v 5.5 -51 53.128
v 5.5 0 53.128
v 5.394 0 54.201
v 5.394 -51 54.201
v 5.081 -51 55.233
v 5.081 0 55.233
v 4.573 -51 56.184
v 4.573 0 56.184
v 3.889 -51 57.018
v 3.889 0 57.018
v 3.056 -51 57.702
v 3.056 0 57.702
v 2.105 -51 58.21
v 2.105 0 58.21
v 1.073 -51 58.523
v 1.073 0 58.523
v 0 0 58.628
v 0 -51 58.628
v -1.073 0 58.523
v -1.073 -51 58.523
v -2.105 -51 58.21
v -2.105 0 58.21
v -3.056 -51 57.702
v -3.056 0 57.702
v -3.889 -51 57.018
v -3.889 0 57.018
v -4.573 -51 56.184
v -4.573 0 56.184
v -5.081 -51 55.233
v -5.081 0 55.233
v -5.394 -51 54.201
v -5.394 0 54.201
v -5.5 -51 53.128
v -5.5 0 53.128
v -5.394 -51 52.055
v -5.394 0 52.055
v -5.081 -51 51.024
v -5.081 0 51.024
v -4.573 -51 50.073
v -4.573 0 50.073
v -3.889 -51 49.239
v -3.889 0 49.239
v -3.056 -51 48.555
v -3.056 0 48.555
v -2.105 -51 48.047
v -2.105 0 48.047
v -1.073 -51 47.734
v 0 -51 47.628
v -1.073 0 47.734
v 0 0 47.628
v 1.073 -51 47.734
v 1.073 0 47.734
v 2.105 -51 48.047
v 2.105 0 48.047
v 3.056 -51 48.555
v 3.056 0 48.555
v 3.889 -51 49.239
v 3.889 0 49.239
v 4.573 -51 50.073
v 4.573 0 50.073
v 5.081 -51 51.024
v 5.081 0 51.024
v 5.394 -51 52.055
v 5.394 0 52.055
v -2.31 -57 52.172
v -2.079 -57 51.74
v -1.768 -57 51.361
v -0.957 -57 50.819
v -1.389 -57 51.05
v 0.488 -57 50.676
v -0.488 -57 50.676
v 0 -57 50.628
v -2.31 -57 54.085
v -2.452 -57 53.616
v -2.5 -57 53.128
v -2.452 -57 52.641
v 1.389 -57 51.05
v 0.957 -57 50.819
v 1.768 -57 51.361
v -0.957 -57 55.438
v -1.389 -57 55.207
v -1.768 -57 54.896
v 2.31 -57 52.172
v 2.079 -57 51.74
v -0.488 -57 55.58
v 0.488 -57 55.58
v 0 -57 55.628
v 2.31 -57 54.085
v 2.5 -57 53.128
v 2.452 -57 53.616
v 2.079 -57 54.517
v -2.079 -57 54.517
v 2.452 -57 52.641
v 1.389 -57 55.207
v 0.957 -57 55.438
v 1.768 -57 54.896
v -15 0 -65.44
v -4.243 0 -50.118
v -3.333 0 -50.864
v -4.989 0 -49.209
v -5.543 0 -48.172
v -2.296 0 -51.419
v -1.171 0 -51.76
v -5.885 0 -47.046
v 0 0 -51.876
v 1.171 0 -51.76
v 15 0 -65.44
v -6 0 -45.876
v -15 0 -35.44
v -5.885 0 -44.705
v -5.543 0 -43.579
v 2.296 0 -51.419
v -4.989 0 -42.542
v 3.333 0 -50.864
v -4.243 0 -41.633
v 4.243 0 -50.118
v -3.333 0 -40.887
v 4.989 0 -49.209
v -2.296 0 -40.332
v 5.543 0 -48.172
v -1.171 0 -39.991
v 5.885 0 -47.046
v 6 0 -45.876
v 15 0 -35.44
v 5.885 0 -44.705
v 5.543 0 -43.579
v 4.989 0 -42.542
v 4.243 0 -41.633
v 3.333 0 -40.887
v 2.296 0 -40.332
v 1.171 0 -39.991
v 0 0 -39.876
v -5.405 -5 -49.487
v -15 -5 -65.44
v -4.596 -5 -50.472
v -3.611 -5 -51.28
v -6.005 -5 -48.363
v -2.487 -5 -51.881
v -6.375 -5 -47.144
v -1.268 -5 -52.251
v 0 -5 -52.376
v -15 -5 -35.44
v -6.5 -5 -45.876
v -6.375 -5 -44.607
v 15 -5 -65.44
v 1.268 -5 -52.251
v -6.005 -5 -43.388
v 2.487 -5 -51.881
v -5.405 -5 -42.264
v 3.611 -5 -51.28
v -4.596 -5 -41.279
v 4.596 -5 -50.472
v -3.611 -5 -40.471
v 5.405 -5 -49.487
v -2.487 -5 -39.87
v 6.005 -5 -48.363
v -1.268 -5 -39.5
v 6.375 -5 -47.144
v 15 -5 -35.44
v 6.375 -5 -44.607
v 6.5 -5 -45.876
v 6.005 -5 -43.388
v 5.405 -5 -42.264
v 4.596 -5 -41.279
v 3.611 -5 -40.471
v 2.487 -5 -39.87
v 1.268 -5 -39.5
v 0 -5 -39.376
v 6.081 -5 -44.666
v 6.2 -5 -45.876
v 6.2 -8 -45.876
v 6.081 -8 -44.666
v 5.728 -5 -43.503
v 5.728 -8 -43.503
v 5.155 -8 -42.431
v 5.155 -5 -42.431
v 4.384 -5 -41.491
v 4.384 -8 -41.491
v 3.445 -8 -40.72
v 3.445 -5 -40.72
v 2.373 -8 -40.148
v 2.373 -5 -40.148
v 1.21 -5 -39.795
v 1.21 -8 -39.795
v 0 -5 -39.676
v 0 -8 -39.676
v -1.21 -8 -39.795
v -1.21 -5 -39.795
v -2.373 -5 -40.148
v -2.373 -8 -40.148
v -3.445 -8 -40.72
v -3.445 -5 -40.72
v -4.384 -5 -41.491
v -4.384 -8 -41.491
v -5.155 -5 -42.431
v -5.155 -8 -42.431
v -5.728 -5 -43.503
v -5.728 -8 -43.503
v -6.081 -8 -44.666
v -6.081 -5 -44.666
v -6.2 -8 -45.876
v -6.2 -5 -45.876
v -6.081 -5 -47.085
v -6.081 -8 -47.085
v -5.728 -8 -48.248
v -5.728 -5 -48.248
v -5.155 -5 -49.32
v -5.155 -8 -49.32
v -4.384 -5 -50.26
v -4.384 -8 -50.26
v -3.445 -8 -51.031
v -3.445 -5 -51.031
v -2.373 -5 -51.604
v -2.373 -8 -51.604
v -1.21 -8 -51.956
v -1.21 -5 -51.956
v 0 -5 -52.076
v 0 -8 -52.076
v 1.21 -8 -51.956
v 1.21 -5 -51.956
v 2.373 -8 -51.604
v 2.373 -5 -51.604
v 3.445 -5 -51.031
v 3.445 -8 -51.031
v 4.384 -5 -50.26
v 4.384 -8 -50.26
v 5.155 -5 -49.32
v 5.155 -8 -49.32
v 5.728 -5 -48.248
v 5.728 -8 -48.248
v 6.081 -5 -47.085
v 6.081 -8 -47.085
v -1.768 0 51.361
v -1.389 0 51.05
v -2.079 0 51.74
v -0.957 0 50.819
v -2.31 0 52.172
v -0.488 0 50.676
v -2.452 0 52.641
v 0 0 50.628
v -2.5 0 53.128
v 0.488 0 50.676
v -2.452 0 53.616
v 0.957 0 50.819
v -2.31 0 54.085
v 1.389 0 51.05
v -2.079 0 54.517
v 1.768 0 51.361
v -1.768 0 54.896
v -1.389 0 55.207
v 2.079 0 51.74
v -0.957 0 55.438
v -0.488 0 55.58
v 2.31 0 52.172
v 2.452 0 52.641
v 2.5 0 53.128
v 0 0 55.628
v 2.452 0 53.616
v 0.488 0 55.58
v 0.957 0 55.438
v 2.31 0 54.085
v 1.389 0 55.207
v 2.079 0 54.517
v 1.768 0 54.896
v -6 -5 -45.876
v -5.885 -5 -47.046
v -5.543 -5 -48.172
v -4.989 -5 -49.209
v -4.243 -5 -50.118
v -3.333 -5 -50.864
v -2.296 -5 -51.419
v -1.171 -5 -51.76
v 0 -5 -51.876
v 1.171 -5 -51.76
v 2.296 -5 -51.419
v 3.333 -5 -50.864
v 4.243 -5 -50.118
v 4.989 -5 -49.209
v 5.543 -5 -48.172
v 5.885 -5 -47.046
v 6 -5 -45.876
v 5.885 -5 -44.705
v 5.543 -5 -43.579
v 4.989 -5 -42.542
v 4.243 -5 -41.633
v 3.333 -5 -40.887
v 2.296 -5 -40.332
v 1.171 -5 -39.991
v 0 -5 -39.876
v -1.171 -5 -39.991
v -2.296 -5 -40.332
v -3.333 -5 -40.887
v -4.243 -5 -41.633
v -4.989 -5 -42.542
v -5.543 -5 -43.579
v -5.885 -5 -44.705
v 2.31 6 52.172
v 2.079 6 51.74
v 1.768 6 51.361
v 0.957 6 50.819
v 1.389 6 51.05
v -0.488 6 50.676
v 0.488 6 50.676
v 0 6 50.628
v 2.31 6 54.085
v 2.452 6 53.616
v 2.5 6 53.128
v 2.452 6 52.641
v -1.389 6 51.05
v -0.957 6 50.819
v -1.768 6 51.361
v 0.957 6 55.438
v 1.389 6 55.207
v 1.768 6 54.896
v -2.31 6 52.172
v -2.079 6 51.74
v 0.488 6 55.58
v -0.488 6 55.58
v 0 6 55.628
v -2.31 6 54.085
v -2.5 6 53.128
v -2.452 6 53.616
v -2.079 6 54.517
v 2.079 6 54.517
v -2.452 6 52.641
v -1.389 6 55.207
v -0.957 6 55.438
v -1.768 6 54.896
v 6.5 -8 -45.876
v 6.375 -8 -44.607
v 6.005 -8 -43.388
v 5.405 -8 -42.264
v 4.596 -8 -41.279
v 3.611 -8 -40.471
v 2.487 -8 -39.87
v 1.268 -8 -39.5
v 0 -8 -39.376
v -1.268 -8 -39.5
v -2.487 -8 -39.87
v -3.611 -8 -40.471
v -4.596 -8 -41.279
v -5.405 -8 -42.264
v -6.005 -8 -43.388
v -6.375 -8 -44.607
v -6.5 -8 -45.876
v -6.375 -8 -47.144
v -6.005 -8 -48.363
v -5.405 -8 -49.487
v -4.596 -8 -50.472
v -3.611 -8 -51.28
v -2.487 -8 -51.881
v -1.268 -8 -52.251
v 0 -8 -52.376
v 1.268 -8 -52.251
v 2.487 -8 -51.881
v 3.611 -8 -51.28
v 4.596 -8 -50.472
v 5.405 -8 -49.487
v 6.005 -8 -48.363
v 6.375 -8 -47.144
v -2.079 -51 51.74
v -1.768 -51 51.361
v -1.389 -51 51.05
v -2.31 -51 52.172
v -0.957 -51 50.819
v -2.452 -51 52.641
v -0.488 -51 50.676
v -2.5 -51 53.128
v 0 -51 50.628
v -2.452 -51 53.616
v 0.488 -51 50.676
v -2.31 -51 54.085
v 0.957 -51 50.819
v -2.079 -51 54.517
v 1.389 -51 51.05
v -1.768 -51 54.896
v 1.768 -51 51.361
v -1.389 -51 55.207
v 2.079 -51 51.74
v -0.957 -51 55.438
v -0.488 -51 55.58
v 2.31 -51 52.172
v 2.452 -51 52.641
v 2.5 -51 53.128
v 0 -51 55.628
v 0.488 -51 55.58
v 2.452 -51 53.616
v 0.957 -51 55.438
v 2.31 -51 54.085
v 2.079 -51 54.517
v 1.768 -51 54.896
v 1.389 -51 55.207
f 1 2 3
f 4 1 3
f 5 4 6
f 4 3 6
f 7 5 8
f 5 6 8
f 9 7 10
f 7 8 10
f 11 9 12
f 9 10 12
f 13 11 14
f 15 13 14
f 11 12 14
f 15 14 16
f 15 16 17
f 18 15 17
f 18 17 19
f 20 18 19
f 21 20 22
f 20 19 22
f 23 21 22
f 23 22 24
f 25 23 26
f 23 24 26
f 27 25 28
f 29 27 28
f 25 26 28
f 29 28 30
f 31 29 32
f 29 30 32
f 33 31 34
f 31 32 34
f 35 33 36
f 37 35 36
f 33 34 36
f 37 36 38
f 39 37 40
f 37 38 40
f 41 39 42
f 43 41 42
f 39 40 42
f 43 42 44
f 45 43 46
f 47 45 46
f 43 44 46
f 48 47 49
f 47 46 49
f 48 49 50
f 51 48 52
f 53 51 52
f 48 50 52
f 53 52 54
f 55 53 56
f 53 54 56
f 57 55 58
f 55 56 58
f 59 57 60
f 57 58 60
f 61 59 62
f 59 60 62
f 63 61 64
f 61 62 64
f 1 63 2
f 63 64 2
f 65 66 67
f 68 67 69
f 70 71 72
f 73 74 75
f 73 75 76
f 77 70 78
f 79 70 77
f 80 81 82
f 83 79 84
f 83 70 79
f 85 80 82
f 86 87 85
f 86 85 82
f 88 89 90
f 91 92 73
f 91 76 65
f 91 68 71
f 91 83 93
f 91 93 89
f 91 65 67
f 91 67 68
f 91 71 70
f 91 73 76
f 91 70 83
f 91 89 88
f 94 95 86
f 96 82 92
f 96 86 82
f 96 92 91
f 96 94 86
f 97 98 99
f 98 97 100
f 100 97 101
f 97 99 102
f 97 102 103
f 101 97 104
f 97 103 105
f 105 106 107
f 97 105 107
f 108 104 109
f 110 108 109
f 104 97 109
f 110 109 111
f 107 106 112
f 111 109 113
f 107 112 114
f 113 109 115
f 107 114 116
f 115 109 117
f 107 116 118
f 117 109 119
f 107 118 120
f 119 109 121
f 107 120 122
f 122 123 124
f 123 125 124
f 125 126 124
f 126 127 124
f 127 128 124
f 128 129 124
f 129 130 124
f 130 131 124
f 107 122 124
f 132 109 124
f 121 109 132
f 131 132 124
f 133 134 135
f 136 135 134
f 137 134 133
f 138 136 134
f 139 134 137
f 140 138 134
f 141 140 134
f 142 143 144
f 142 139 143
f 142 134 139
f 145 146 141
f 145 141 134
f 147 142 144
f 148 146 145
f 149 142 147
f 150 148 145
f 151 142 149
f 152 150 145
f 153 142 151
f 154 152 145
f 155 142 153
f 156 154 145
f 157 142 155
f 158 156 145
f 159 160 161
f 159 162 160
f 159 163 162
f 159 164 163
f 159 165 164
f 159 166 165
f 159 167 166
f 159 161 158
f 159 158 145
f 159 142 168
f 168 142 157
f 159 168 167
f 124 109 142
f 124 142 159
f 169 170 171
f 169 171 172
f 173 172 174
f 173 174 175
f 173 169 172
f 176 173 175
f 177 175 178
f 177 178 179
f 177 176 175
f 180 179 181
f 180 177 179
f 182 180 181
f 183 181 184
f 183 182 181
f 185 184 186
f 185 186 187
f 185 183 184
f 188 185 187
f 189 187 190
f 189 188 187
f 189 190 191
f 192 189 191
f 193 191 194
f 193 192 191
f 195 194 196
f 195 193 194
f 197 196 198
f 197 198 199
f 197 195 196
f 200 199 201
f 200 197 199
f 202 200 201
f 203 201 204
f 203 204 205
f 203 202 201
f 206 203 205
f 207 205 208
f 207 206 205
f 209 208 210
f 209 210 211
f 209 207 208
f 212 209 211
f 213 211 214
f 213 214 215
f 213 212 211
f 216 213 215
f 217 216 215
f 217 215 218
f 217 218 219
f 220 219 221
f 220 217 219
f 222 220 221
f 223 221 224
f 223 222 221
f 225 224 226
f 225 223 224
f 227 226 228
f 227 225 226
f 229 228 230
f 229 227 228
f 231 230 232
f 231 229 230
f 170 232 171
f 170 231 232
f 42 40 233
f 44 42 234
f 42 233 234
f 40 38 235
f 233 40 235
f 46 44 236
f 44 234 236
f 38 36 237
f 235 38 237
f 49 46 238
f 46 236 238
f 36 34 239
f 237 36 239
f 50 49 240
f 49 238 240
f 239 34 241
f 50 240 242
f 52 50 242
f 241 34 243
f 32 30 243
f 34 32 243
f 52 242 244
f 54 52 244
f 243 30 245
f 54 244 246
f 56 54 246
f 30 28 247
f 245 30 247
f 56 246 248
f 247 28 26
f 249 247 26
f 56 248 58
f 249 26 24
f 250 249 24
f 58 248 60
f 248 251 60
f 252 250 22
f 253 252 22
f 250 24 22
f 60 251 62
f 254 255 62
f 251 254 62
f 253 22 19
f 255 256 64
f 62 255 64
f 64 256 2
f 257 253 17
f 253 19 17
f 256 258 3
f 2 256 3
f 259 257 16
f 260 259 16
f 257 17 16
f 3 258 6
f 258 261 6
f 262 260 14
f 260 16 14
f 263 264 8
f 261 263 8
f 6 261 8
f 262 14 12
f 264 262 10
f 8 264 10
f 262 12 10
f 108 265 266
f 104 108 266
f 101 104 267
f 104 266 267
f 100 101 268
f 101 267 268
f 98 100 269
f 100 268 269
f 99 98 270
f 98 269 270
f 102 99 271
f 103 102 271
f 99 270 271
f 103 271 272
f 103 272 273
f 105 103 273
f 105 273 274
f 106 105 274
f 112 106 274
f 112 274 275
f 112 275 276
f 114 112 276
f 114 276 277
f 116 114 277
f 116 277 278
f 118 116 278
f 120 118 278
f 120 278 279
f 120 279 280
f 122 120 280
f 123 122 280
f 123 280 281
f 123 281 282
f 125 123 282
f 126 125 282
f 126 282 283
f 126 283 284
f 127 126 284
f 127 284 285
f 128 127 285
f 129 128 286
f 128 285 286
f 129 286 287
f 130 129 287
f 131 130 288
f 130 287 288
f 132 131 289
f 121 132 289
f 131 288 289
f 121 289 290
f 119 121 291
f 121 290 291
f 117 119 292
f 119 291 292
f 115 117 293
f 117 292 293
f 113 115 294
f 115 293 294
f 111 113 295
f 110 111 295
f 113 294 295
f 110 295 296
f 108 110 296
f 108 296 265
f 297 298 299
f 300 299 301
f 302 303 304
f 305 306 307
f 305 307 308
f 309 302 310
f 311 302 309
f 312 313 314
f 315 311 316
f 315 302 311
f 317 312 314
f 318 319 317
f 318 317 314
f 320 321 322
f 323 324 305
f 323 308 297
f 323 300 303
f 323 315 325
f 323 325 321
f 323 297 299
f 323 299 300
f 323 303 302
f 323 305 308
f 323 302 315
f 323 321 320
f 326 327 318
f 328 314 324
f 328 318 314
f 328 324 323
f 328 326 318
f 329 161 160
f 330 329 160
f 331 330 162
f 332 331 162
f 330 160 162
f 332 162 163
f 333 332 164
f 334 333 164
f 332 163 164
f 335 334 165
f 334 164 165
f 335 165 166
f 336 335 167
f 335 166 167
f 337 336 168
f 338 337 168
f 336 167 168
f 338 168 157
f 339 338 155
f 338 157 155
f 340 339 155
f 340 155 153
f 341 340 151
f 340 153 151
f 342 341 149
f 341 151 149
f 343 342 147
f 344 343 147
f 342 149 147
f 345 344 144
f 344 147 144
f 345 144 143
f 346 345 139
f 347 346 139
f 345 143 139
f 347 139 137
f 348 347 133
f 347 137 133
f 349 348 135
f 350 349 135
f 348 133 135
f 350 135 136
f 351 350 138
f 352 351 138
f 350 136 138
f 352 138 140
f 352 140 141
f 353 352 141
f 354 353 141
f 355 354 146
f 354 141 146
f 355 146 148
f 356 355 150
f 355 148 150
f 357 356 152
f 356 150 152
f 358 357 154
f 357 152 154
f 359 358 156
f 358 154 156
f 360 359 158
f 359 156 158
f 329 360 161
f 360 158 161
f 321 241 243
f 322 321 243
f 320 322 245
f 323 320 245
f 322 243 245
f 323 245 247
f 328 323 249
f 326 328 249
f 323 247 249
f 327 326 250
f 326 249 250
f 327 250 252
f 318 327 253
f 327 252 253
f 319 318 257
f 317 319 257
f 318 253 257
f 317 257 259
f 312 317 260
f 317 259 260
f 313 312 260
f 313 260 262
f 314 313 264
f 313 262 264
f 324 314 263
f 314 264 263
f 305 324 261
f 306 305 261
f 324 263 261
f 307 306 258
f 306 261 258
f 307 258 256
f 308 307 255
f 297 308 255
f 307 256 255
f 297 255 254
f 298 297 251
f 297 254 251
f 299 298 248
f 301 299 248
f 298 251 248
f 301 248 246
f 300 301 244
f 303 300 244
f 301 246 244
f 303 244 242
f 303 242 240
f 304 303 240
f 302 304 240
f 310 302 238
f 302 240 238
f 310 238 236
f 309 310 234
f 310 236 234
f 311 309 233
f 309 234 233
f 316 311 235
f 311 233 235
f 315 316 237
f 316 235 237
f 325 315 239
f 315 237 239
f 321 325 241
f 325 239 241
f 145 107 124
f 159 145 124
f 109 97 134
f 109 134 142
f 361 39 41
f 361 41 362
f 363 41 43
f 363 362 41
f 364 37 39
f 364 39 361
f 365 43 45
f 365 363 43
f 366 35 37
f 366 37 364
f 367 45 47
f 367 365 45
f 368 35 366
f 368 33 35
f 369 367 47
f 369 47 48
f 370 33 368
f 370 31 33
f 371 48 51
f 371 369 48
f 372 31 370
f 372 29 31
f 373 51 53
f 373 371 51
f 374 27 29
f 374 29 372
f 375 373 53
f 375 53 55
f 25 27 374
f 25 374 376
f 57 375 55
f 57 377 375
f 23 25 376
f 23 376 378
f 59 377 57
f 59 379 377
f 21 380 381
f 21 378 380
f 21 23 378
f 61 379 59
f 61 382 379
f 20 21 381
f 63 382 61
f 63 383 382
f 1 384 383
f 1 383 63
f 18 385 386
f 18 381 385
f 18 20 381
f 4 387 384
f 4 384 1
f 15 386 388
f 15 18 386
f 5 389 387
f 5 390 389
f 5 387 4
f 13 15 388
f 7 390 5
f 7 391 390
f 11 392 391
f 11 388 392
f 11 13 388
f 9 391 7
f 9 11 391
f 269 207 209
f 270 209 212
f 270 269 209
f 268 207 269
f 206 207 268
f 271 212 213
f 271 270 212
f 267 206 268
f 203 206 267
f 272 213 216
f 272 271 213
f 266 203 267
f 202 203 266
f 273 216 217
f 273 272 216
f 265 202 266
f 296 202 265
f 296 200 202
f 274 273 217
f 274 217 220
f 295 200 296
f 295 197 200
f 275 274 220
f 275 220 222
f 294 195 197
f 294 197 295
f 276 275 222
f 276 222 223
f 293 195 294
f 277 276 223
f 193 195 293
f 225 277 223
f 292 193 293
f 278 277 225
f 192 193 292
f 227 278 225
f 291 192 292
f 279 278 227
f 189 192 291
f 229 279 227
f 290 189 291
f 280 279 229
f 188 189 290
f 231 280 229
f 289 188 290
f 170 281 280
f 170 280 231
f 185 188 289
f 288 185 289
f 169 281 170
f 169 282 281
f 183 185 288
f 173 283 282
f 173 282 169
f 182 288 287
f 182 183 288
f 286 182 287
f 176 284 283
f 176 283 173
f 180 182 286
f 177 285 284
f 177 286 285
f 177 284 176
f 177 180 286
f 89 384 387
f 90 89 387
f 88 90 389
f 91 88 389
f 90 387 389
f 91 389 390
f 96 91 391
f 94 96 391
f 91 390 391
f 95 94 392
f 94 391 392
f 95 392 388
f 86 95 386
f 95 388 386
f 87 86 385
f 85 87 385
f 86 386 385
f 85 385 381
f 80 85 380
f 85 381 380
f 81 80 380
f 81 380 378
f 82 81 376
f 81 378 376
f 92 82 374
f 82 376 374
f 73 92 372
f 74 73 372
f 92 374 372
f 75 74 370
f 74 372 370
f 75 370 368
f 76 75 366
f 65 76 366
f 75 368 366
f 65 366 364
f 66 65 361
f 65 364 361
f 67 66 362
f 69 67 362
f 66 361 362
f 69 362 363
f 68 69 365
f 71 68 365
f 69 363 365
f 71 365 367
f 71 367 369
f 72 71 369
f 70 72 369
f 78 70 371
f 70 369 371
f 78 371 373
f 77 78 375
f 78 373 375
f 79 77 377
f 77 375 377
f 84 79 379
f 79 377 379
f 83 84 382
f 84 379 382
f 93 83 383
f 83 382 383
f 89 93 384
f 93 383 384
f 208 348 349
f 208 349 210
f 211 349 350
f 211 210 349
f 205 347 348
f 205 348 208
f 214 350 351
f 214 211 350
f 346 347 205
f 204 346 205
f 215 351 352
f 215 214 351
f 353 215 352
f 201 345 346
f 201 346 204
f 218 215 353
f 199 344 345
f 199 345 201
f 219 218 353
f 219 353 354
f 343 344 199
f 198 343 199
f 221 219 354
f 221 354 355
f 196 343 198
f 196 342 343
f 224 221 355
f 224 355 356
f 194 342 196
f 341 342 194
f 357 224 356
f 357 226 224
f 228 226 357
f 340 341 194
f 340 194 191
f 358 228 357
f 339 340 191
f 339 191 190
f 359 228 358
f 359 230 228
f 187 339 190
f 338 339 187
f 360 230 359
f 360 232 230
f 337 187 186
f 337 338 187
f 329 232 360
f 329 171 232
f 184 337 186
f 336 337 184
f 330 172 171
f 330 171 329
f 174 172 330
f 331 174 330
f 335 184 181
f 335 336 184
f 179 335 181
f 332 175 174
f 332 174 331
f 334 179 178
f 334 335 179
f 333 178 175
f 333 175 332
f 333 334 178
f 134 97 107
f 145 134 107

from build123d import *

# Parameters (mm, degrees)
F0_R      = 6
F0_R_2    = 5.7
F1_DEPTH  = 50
F2_R      = 5.5
F3_DEPTH  = 51
F4_R      = 8.5
F5_DEPTH  = 4
F6_R      = 2.5
F7_DEPTH  = 6
F9_W      = 30
F9_H      = 30
F10_DEPTH = 5
F12_D     = 12
F13_R     = 6.5
F13_R_2   = 6.2
F14_DEPTH = 3
F15_R     = 5.5
F16_DEPTH = 39
F18_D     = 5
F18_DEPTH = 8
F18_TIP   = 1.5021515476
F8_R      = 2.5
F19_DEPTH = 6


with BuildPart() as f1:
    # F0 (on Front) → F1 (new body)
    with BuildSketch(Plane.XZ):
        Circle(F0_R)
        Circle(F0_R_2, mode=Mode.SUBTRACT)
    extrude(amount=F1_DEPTH)


with BuildPart() as f3:
    # F2 (on Front) → F3 (new body)
    with BuildSketch(Plane.XZ):
        with Locations((0, 53.1284292551)):
            Circle(F2_R)
    extrude(amount=F3_DEPTH)

    # F6 (on face) → F7 (join)
    with BuildSketch(Plane.XZ.offset(51)):
        with Locations((0, 53.1284292551)):
            Circle(F6_R)
    extrude(amount=F7_DEPTH)

    # F8 (on face) → F19 (join)
    with BuildSketch(Plane(origin=(0, 0, 0), x_dir=(-1, 0, 0), z_dir=(0, 1, 0))):
        with Locations((0, 53.1284292551)):
            Circle(F8_R)
    extrude(amount=F19_DEPTH)


with BuildPart() as f5:
    # F4 (on Front) → F5 (new body)
    with BuildSketch(Plane.XZ):
        with Locations((0, 21.613052828)):
            Circle(F4_R)
    extrude(amount=F5_DEPTH)

    # F15 (on face) → F16 (join)
    with BuildSketch(Plane.XZ.offset(4)):
        with Locations((0, 21.613052828)):
            Circle(F15_R)
    extrude(amount=F16_DEPTH)

    # F18
    with Locations(Plane.XZ.offset(43)):
        with Locations((0, 21.613052828)):
            Hole(F18_D / 2, depth=F18_DEPTH)
            with Locations((0, 0, -(F18_DEPTH + F18_TIP / 2))):  # 118° drill point
                Cone(0, F18_D / 2, F18_TIP, mode=Mode.SUBTRACT)


with BuildPart() as f10:
    # F9 (on Front) → F10 (new body)
    with BuildSketch(Plane.XZ):
        with Locations((0, -50.4402406514)):
            Rectangle(F9_W, F9_H)
    extrude(amount=F10_DEPTH)

    # F12 (through all)
    with Locations(Plane(origin=(0, 0, 0), x_dir=(1, 0, 0), z_dir=(0, 1, 0))):
        with Locations((0, 45.8755606015)):
            Hole(F12_D / 2)

    # F13 (on face) → F14 (join)
    with BuildSketch(Plane.XZ.offset(5)):
        with Locations((0, -45.8755606015)):
            Circle(F13_R)
        with Locations((0, -45.8755606015)):
            Circle(F13_R_2, mode=Mode.SUBTRACT)
    extrude(amount=F14_DEPTH)


with BuildPart() as f22_1:
    # F22: copy of F3
    add(f3.part)


solid = Compound([f3.part, f10.part])
